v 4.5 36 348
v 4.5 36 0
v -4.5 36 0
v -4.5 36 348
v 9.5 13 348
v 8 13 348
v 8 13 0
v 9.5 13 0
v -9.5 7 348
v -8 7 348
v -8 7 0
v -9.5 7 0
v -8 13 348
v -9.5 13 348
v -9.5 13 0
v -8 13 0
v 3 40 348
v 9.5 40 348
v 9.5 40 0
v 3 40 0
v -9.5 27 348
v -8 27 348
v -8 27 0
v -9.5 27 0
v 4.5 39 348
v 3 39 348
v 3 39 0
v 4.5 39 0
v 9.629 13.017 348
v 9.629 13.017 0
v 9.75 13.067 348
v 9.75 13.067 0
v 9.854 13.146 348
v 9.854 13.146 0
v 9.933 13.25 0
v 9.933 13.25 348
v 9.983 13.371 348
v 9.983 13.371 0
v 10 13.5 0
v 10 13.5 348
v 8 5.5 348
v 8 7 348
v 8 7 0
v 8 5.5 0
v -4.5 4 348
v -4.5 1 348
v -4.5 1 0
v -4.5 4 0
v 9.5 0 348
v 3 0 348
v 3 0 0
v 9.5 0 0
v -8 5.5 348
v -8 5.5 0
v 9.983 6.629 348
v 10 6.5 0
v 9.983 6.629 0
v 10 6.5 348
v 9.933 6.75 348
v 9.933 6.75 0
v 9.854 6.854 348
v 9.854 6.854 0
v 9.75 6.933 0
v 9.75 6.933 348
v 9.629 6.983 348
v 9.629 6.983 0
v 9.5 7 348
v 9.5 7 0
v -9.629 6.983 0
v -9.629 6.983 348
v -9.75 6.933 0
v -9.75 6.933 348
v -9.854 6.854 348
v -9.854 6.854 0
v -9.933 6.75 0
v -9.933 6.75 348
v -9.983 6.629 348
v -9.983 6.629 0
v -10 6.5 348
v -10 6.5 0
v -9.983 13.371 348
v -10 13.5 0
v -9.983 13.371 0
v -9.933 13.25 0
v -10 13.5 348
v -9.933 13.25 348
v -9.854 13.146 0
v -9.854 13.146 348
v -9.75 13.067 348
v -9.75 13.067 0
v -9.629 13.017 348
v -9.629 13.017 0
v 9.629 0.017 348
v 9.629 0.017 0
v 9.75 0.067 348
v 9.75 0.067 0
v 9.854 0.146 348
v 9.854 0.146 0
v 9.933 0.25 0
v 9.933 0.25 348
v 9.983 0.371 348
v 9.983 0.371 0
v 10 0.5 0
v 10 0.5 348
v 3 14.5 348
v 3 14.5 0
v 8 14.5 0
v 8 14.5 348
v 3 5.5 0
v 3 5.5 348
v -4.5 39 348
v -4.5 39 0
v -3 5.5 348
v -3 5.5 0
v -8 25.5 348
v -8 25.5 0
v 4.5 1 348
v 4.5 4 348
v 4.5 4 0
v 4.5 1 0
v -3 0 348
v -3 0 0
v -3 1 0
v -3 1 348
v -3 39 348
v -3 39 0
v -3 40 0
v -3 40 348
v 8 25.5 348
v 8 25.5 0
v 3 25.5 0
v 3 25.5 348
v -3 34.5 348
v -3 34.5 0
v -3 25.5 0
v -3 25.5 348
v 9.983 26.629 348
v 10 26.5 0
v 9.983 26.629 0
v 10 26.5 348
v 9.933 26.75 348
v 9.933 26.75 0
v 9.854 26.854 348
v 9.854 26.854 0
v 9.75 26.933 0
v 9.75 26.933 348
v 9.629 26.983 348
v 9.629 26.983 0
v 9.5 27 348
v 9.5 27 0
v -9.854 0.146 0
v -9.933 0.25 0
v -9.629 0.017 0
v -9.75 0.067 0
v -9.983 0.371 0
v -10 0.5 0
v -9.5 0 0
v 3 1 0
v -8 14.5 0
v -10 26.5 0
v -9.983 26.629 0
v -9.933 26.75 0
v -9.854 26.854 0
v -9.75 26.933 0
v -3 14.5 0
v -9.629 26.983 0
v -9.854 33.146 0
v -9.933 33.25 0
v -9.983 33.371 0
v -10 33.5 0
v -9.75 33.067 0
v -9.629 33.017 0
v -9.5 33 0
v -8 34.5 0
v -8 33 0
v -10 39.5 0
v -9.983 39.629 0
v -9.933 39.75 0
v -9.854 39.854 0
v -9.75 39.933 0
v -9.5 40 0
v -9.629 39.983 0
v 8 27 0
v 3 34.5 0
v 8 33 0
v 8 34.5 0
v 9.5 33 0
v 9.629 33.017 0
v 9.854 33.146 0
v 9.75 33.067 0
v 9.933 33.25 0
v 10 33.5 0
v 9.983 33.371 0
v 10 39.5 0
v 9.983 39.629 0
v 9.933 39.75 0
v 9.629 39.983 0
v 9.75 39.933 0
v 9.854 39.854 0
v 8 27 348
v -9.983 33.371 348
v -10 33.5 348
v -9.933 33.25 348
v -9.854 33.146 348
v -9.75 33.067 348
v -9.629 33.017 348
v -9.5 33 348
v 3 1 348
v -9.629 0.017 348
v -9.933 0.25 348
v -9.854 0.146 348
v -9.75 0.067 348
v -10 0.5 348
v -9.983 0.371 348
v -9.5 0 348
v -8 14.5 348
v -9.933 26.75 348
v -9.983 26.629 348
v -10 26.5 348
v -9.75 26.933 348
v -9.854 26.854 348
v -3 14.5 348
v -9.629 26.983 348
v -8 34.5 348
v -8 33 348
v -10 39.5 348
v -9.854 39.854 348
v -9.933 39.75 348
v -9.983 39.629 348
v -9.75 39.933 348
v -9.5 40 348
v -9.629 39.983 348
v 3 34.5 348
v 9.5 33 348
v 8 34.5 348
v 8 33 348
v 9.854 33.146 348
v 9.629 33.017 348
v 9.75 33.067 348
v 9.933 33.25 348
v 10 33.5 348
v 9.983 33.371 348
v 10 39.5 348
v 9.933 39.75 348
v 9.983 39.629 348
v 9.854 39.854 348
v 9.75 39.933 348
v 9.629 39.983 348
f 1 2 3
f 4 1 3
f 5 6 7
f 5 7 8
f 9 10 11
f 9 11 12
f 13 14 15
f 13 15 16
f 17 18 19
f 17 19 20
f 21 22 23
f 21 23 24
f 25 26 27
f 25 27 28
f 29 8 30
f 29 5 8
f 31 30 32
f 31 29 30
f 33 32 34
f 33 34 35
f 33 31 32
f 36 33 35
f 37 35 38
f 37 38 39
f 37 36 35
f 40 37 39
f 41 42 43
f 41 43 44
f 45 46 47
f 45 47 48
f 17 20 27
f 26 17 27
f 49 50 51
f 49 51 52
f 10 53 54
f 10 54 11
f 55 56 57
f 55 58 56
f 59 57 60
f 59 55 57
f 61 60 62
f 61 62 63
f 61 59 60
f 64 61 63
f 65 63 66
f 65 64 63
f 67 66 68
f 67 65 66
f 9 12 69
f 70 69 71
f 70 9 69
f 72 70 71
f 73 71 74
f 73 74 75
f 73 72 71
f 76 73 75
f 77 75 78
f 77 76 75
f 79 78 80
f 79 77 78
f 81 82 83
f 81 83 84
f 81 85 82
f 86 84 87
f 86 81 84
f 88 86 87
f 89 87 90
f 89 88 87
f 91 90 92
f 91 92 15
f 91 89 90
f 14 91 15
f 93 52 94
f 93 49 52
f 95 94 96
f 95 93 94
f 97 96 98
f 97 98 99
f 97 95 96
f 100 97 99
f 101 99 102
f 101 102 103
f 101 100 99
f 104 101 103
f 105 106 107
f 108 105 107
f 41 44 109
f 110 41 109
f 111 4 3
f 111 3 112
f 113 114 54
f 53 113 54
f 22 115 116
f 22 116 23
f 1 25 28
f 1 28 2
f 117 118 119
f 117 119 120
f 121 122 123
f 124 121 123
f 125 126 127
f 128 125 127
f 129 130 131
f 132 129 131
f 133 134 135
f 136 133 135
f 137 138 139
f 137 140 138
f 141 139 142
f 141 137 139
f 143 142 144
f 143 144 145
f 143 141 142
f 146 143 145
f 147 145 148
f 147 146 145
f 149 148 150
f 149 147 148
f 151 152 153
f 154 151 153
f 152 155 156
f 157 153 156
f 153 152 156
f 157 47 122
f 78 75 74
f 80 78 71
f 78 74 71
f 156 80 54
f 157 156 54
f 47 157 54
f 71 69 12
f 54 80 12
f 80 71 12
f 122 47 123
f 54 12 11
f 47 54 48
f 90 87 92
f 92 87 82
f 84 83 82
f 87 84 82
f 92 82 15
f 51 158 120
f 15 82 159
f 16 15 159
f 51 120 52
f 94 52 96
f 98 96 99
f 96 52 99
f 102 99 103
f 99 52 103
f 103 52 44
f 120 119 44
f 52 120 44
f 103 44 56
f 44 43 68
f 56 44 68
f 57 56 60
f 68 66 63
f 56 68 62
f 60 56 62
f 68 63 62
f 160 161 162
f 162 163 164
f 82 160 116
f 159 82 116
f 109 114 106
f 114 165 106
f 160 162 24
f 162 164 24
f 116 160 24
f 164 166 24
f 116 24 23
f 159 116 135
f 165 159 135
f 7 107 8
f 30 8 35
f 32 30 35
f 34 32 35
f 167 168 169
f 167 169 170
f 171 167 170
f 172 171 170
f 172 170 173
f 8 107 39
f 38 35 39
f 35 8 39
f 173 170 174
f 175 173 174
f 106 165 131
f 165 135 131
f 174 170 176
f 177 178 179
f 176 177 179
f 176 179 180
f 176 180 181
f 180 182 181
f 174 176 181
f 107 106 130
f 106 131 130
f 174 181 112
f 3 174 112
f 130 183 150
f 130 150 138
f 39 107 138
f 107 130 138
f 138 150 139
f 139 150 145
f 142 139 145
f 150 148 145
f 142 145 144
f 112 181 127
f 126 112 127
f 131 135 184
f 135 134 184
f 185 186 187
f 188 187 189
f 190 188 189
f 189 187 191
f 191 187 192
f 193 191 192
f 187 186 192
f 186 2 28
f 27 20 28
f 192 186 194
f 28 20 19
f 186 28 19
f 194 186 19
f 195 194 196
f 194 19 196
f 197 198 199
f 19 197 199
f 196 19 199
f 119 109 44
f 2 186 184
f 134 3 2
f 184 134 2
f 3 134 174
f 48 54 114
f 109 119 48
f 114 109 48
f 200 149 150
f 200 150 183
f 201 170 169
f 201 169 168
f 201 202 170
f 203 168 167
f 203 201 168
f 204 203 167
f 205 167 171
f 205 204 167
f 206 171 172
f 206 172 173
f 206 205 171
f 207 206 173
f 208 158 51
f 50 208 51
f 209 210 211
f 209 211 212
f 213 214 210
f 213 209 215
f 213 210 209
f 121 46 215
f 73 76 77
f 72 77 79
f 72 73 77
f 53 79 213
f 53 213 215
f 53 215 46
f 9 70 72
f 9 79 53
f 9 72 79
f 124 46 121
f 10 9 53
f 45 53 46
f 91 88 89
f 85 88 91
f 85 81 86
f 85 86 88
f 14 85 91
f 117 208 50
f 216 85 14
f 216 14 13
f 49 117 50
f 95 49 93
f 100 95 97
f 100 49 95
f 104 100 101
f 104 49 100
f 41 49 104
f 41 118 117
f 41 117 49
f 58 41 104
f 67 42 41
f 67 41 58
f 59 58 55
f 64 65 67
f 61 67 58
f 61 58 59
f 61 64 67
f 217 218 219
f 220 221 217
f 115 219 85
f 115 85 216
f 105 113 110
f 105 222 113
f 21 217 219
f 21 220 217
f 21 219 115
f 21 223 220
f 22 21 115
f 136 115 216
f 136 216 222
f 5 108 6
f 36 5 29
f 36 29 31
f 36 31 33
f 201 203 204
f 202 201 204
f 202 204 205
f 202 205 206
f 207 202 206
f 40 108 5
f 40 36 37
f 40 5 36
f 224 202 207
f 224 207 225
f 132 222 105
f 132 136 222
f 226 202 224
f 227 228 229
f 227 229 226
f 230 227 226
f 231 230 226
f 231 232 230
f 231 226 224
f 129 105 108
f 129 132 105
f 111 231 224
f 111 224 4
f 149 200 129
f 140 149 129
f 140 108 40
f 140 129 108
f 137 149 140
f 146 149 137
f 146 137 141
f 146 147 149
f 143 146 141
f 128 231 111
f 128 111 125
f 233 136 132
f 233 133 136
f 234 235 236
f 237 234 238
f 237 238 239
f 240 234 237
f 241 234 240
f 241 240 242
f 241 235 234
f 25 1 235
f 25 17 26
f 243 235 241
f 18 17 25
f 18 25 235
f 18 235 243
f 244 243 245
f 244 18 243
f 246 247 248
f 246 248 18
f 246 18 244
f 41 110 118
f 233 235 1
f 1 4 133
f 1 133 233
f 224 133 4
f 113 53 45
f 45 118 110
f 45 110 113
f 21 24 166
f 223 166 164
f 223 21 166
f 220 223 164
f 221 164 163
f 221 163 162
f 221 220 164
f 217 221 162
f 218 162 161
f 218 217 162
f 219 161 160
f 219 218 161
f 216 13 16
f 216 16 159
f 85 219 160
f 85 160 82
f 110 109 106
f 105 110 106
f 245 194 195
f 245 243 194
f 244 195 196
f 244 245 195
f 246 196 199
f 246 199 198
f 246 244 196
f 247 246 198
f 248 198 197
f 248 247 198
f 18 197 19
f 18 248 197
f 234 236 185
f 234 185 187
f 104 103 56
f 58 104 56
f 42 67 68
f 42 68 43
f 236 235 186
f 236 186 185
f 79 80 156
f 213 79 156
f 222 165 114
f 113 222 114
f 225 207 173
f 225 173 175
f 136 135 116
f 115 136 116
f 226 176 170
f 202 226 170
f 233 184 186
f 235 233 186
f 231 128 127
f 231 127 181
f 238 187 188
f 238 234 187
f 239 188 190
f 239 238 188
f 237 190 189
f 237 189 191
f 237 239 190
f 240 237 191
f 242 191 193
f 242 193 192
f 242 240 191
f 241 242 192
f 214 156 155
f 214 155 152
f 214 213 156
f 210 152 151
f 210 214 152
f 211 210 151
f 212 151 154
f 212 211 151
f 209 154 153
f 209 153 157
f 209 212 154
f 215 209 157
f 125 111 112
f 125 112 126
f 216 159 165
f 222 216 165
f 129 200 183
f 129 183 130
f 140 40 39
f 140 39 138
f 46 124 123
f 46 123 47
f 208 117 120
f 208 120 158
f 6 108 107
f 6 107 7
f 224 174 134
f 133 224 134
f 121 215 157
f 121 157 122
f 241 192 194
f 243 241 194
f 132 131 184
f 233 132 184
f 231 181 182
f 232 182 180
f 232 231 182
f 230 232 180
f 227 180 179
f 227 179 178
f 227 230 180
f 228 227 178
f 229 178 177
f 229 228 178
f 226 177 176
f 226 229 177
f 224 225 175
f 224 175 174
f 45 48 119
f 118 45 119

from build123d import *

# Parameters (mm, degrees)
EXTRUDE_1_DEPTH = 348
FILLET_1_R      = 0.5


with BuildPart() as part:
    # 草圖1 → 填料-伸長1 (new body)
    with BuildSketch(Plane.XY):
        Polygon((-4.5, 4), (4.5, 4), (4.5, 1), (3, 1), (3, 0), (10, 0), (10, 7), (8, 7), (8, 5.5), (3, 5.5), (3, 14.5), (8, 14.5), (8, 13), (10, 13), (10, 27), (8, 27), (8, 25.5), (3, 25.5), (3, 34.5), (8, 34.5), (8, 33), (10, 33), (10, 40), (3, 40), (3, 39), (4.5, 39), (4.5, 36), (-4.5, 36), (-4.5, 39), (-3, 39), (-3, 40), (-10, 40), (-10, 33), (-8, 33), (-8, 34.5), (-3, 34.5), (-3, 25.5), (-8, 25.5), (-8, 27), (-10, 27), (-10, 13), (-8, 13), (-8, 14.5), (-3, 14.5), (-3, 5.5), (-8, 5.5), (-8, 7), (-10, 7), (-10, 0), (-3, 0), (-3, 1), (-4.5, 1), align=None)
    extrude(amount=EXTRUDE_1_DEPTH)

    # 圓角1
    fillet_1_edges = [part.edges().sort_by_distance(p)[0] for p in [
        (-10, 0, 174),
        (-10, 7, 174),
        (-10, 13, 174),
        (-10, 27, 174),
        (-10, 33, 174),
        (-10, 40, 174),
        (10, 40, 174),
        (10, 33, 174),
        (10, 27, 174),
        (10, 13, 174),
        (10, 7, 174),
        (10, 0, 174),
    ]]
    fillet(fillet_1_edges, radius=FILLET_1_R)


solid = part.part
